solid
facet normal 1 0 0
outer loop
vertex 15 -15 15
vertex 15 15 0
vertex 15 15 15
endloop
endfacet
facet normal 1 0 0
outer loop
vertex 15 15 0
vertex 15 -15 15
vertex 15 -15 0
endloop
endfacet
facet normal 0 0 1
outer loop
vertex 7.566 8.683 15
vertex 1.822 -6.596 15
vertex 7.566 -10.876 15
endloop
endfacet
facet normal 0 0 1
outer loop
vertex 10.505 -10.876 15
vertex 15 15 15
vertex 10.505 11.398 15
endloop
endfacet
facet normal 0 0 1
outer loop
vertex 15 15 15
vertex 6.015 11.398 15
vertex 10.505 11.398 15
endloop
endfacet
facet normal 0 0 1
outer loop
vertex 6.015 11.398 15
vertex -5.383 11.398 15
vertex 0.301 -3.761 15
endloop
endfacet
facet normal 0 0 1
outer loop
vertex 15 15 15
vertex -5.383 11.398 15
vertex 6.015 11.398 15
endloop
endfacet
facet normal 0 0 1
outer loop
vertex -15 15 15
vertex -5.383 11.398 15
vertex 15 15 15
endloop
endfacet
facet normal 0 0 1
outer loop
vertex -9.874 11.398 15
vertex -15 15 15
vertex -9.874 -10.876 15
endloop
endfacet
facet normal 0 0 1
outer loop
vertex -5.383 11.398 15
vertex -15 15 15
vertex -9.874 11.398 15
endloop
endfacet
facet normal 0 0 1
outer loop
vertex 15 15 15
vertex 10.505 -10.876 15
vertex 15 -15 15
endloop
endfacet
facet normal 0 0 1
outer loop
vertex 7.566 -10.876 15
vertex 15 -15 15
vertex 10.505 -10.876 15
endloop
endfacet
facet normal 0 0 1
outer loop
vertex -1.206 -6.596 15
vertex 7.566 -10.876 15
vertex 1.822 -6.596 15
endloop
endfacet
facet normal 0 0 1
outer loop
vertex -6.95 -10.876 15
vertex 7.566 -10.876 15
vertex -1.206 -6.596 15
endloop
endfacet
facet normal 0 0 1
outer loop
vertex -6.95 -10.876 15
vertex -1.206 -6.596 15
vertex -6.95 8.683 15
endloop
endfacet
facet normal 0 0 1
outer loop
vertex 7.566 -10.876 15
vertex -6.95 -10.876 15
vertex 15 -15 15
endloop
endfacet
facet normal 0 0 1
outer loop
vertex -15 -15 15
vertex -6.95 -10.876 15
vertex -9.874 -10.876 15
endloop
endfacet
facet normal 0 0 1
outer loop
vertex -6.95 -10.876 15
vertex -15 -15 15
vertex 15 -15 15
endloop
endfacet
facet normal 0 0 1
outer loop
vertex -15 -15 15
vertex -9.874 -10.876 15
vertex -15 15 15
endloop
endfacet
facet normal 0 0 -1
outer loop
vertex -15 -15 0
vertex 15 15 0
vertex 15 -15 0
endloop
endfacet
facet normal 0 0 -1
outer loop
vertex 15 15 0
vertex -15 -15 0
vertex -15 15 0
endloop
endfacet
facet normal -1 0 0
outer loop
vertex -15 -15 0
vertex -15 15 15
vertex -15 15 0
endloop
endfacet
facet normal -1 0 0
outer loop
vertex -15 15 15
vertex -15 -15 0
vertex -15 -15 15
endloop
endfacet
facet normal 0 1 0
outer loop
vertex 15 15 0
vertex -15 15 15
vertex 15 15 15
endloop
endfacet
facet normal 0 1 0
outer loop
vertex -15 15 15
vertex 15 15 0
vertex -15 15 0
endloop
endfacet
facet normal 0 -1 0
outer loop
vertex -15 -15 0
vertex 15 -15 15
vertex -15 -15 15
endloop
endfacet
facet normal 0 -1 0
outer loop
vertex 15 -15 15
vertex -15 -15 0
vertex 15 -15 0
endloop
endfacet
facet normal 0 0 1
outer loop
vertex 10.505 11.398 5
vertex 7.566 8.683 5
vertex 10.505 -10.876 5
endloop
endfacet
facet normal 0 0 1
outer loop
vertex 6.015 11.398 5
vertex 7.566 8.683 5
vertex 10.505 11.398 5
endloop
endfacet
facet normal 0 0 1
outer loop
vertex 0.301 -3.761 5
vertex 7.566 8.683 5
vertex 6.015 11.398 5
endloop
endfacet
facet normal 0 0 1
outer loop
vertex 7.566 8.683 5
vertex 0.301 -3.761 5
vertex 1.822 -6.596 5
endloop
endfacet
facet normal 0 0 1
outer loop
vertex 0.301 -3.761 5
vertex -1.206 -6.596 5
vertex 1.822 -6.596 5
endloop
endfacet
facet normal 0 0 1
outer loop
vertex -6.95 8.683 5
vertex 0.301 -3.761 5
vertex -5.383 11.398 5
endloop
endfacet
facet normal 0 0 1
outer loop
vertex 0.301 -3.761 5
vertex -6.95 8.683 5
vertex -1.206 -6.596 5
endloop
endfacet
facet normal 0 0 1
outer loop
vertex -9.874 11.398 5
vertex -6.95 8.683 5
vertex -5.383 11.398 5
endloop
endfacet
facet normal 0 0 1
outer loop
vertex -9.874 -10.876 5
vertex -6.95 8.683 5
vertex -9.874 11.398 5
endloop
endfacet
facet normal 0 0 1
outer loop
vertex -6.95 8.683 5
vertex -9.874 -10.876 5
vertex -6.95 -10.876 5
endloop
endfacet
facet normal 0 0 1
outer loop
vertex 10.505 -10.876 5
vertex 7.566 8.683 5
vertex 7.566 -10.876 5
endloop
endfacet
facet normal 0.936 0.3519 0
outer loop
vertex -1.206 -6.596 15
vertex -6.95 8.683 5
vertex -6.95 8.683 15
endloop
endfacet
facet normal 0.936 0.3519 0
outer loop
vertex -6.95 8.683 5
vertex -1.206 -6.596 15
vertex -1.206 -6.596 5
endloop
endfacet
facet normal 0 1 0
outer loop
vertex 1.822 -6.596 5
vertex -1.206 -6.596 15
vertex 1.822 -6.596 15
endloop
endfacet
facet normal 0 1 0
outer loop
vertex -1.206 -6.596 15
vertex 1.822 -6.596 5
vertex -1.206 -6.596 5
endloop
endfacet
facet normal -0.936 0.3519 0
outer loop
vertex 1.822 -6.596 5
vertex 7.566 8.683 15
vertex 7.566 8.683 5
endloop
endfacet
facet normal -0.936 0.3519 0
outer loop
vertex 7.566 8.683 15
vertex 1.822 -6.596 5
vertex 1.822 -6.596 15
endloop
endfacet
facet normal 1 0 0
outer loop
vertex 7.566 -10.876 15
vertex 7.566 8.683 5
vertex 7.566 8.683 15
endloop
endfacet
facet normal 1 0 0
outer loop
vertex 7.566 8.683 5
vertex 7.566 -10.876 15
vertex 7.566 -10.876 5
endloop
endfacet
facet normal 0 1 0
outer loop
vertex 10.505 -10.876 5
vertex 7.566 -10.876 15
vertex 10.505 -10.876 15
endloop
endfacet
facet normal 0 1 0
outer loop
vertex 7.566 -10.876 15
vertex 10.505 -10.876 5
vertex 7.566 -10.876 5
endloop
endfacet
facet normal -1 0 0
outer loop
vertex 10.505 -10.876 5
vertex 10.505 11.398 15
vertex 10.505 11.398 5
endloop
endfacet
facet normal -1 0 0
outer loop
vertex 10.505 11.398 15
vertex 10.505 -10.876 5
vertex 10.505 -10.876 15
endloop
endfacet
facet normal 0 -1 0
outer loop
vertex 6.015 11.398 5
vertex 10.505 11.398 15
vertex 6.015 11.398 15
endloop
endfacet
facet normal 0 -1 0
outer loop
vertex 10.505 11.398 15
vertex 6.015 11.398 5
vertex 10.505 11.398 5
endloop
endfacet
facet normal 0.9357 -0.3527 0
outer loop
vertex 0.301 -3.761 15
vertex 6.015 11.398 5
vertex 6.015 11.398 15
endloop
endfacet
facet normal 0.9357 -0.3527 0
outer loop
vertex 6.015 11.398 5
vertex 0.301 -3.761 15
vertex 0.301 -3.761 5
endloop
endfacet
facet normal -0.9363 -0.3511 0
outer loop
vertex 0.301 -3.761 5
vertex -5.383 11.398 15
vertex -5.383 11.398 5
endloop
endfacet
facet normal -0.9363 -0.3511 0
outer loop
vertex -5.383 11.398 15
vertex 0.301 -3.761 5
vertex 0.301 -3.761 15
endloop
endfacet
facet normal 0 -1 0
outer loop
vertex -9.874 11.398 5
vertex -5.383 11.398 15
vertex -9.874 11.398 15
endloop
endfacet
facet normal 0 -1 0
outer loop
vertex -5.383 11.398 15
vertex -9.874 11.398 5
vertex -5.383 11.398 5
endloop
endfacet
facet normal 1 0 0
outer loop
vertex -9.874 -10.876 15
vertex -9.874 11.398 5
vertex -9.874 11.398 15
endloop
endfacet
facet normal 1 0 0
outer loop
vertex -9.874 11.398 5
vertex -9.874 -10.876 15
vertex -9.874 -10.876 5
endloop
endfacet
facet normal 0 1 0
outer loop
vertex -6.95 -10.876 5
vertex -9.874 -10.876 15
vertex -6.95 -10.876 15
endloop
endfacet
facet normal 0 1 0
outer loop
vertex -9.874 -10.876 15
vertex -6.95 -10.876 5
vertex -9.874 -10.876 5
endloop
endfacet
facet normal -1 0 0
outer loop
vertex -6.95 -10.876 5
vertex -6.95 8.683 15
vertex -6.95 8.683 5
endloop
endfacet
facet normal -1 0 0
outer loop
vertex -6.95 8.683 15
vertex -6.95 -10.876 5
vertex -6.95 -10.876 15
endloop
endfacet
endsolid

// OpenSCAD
// LetterBlock.scad - Basic usage of text() and linear_extrude()

// Module instantiation
LetterBlock("M");

// Module definition.
// size=30 defines an optional parameter with a default value.
module LetterBlock(letter, size=30) {
    difference() {
        translate([0,0,size/4]) cube([size,size,size/2], center=true);
        translate([0,0,size/6]) {
            // convexity is needed for correct preview
            // since characters can be highly concave
            linear_extrude(height=size, convexity=4)
                text(letter,
                     size=size*22/30,
                     font="Tahoma",
                     halign="center",
                     valign="center");
        }
    }
}

echo(version=version());
// Written by Marius Kintel <marius@kintel.net>
//
// To the extent possible under law, the author(s) have dedicated all
// copyright and related and neighboring rights to this software to the
// public domain worldwide. This software is distributed without any
// warranty.
//
// You should have received a copy of the CC0 Public Domain
// Dedication along with this software.
// If not, see <http://creativecommons.org/publicdomain/zero/1.0/>.
